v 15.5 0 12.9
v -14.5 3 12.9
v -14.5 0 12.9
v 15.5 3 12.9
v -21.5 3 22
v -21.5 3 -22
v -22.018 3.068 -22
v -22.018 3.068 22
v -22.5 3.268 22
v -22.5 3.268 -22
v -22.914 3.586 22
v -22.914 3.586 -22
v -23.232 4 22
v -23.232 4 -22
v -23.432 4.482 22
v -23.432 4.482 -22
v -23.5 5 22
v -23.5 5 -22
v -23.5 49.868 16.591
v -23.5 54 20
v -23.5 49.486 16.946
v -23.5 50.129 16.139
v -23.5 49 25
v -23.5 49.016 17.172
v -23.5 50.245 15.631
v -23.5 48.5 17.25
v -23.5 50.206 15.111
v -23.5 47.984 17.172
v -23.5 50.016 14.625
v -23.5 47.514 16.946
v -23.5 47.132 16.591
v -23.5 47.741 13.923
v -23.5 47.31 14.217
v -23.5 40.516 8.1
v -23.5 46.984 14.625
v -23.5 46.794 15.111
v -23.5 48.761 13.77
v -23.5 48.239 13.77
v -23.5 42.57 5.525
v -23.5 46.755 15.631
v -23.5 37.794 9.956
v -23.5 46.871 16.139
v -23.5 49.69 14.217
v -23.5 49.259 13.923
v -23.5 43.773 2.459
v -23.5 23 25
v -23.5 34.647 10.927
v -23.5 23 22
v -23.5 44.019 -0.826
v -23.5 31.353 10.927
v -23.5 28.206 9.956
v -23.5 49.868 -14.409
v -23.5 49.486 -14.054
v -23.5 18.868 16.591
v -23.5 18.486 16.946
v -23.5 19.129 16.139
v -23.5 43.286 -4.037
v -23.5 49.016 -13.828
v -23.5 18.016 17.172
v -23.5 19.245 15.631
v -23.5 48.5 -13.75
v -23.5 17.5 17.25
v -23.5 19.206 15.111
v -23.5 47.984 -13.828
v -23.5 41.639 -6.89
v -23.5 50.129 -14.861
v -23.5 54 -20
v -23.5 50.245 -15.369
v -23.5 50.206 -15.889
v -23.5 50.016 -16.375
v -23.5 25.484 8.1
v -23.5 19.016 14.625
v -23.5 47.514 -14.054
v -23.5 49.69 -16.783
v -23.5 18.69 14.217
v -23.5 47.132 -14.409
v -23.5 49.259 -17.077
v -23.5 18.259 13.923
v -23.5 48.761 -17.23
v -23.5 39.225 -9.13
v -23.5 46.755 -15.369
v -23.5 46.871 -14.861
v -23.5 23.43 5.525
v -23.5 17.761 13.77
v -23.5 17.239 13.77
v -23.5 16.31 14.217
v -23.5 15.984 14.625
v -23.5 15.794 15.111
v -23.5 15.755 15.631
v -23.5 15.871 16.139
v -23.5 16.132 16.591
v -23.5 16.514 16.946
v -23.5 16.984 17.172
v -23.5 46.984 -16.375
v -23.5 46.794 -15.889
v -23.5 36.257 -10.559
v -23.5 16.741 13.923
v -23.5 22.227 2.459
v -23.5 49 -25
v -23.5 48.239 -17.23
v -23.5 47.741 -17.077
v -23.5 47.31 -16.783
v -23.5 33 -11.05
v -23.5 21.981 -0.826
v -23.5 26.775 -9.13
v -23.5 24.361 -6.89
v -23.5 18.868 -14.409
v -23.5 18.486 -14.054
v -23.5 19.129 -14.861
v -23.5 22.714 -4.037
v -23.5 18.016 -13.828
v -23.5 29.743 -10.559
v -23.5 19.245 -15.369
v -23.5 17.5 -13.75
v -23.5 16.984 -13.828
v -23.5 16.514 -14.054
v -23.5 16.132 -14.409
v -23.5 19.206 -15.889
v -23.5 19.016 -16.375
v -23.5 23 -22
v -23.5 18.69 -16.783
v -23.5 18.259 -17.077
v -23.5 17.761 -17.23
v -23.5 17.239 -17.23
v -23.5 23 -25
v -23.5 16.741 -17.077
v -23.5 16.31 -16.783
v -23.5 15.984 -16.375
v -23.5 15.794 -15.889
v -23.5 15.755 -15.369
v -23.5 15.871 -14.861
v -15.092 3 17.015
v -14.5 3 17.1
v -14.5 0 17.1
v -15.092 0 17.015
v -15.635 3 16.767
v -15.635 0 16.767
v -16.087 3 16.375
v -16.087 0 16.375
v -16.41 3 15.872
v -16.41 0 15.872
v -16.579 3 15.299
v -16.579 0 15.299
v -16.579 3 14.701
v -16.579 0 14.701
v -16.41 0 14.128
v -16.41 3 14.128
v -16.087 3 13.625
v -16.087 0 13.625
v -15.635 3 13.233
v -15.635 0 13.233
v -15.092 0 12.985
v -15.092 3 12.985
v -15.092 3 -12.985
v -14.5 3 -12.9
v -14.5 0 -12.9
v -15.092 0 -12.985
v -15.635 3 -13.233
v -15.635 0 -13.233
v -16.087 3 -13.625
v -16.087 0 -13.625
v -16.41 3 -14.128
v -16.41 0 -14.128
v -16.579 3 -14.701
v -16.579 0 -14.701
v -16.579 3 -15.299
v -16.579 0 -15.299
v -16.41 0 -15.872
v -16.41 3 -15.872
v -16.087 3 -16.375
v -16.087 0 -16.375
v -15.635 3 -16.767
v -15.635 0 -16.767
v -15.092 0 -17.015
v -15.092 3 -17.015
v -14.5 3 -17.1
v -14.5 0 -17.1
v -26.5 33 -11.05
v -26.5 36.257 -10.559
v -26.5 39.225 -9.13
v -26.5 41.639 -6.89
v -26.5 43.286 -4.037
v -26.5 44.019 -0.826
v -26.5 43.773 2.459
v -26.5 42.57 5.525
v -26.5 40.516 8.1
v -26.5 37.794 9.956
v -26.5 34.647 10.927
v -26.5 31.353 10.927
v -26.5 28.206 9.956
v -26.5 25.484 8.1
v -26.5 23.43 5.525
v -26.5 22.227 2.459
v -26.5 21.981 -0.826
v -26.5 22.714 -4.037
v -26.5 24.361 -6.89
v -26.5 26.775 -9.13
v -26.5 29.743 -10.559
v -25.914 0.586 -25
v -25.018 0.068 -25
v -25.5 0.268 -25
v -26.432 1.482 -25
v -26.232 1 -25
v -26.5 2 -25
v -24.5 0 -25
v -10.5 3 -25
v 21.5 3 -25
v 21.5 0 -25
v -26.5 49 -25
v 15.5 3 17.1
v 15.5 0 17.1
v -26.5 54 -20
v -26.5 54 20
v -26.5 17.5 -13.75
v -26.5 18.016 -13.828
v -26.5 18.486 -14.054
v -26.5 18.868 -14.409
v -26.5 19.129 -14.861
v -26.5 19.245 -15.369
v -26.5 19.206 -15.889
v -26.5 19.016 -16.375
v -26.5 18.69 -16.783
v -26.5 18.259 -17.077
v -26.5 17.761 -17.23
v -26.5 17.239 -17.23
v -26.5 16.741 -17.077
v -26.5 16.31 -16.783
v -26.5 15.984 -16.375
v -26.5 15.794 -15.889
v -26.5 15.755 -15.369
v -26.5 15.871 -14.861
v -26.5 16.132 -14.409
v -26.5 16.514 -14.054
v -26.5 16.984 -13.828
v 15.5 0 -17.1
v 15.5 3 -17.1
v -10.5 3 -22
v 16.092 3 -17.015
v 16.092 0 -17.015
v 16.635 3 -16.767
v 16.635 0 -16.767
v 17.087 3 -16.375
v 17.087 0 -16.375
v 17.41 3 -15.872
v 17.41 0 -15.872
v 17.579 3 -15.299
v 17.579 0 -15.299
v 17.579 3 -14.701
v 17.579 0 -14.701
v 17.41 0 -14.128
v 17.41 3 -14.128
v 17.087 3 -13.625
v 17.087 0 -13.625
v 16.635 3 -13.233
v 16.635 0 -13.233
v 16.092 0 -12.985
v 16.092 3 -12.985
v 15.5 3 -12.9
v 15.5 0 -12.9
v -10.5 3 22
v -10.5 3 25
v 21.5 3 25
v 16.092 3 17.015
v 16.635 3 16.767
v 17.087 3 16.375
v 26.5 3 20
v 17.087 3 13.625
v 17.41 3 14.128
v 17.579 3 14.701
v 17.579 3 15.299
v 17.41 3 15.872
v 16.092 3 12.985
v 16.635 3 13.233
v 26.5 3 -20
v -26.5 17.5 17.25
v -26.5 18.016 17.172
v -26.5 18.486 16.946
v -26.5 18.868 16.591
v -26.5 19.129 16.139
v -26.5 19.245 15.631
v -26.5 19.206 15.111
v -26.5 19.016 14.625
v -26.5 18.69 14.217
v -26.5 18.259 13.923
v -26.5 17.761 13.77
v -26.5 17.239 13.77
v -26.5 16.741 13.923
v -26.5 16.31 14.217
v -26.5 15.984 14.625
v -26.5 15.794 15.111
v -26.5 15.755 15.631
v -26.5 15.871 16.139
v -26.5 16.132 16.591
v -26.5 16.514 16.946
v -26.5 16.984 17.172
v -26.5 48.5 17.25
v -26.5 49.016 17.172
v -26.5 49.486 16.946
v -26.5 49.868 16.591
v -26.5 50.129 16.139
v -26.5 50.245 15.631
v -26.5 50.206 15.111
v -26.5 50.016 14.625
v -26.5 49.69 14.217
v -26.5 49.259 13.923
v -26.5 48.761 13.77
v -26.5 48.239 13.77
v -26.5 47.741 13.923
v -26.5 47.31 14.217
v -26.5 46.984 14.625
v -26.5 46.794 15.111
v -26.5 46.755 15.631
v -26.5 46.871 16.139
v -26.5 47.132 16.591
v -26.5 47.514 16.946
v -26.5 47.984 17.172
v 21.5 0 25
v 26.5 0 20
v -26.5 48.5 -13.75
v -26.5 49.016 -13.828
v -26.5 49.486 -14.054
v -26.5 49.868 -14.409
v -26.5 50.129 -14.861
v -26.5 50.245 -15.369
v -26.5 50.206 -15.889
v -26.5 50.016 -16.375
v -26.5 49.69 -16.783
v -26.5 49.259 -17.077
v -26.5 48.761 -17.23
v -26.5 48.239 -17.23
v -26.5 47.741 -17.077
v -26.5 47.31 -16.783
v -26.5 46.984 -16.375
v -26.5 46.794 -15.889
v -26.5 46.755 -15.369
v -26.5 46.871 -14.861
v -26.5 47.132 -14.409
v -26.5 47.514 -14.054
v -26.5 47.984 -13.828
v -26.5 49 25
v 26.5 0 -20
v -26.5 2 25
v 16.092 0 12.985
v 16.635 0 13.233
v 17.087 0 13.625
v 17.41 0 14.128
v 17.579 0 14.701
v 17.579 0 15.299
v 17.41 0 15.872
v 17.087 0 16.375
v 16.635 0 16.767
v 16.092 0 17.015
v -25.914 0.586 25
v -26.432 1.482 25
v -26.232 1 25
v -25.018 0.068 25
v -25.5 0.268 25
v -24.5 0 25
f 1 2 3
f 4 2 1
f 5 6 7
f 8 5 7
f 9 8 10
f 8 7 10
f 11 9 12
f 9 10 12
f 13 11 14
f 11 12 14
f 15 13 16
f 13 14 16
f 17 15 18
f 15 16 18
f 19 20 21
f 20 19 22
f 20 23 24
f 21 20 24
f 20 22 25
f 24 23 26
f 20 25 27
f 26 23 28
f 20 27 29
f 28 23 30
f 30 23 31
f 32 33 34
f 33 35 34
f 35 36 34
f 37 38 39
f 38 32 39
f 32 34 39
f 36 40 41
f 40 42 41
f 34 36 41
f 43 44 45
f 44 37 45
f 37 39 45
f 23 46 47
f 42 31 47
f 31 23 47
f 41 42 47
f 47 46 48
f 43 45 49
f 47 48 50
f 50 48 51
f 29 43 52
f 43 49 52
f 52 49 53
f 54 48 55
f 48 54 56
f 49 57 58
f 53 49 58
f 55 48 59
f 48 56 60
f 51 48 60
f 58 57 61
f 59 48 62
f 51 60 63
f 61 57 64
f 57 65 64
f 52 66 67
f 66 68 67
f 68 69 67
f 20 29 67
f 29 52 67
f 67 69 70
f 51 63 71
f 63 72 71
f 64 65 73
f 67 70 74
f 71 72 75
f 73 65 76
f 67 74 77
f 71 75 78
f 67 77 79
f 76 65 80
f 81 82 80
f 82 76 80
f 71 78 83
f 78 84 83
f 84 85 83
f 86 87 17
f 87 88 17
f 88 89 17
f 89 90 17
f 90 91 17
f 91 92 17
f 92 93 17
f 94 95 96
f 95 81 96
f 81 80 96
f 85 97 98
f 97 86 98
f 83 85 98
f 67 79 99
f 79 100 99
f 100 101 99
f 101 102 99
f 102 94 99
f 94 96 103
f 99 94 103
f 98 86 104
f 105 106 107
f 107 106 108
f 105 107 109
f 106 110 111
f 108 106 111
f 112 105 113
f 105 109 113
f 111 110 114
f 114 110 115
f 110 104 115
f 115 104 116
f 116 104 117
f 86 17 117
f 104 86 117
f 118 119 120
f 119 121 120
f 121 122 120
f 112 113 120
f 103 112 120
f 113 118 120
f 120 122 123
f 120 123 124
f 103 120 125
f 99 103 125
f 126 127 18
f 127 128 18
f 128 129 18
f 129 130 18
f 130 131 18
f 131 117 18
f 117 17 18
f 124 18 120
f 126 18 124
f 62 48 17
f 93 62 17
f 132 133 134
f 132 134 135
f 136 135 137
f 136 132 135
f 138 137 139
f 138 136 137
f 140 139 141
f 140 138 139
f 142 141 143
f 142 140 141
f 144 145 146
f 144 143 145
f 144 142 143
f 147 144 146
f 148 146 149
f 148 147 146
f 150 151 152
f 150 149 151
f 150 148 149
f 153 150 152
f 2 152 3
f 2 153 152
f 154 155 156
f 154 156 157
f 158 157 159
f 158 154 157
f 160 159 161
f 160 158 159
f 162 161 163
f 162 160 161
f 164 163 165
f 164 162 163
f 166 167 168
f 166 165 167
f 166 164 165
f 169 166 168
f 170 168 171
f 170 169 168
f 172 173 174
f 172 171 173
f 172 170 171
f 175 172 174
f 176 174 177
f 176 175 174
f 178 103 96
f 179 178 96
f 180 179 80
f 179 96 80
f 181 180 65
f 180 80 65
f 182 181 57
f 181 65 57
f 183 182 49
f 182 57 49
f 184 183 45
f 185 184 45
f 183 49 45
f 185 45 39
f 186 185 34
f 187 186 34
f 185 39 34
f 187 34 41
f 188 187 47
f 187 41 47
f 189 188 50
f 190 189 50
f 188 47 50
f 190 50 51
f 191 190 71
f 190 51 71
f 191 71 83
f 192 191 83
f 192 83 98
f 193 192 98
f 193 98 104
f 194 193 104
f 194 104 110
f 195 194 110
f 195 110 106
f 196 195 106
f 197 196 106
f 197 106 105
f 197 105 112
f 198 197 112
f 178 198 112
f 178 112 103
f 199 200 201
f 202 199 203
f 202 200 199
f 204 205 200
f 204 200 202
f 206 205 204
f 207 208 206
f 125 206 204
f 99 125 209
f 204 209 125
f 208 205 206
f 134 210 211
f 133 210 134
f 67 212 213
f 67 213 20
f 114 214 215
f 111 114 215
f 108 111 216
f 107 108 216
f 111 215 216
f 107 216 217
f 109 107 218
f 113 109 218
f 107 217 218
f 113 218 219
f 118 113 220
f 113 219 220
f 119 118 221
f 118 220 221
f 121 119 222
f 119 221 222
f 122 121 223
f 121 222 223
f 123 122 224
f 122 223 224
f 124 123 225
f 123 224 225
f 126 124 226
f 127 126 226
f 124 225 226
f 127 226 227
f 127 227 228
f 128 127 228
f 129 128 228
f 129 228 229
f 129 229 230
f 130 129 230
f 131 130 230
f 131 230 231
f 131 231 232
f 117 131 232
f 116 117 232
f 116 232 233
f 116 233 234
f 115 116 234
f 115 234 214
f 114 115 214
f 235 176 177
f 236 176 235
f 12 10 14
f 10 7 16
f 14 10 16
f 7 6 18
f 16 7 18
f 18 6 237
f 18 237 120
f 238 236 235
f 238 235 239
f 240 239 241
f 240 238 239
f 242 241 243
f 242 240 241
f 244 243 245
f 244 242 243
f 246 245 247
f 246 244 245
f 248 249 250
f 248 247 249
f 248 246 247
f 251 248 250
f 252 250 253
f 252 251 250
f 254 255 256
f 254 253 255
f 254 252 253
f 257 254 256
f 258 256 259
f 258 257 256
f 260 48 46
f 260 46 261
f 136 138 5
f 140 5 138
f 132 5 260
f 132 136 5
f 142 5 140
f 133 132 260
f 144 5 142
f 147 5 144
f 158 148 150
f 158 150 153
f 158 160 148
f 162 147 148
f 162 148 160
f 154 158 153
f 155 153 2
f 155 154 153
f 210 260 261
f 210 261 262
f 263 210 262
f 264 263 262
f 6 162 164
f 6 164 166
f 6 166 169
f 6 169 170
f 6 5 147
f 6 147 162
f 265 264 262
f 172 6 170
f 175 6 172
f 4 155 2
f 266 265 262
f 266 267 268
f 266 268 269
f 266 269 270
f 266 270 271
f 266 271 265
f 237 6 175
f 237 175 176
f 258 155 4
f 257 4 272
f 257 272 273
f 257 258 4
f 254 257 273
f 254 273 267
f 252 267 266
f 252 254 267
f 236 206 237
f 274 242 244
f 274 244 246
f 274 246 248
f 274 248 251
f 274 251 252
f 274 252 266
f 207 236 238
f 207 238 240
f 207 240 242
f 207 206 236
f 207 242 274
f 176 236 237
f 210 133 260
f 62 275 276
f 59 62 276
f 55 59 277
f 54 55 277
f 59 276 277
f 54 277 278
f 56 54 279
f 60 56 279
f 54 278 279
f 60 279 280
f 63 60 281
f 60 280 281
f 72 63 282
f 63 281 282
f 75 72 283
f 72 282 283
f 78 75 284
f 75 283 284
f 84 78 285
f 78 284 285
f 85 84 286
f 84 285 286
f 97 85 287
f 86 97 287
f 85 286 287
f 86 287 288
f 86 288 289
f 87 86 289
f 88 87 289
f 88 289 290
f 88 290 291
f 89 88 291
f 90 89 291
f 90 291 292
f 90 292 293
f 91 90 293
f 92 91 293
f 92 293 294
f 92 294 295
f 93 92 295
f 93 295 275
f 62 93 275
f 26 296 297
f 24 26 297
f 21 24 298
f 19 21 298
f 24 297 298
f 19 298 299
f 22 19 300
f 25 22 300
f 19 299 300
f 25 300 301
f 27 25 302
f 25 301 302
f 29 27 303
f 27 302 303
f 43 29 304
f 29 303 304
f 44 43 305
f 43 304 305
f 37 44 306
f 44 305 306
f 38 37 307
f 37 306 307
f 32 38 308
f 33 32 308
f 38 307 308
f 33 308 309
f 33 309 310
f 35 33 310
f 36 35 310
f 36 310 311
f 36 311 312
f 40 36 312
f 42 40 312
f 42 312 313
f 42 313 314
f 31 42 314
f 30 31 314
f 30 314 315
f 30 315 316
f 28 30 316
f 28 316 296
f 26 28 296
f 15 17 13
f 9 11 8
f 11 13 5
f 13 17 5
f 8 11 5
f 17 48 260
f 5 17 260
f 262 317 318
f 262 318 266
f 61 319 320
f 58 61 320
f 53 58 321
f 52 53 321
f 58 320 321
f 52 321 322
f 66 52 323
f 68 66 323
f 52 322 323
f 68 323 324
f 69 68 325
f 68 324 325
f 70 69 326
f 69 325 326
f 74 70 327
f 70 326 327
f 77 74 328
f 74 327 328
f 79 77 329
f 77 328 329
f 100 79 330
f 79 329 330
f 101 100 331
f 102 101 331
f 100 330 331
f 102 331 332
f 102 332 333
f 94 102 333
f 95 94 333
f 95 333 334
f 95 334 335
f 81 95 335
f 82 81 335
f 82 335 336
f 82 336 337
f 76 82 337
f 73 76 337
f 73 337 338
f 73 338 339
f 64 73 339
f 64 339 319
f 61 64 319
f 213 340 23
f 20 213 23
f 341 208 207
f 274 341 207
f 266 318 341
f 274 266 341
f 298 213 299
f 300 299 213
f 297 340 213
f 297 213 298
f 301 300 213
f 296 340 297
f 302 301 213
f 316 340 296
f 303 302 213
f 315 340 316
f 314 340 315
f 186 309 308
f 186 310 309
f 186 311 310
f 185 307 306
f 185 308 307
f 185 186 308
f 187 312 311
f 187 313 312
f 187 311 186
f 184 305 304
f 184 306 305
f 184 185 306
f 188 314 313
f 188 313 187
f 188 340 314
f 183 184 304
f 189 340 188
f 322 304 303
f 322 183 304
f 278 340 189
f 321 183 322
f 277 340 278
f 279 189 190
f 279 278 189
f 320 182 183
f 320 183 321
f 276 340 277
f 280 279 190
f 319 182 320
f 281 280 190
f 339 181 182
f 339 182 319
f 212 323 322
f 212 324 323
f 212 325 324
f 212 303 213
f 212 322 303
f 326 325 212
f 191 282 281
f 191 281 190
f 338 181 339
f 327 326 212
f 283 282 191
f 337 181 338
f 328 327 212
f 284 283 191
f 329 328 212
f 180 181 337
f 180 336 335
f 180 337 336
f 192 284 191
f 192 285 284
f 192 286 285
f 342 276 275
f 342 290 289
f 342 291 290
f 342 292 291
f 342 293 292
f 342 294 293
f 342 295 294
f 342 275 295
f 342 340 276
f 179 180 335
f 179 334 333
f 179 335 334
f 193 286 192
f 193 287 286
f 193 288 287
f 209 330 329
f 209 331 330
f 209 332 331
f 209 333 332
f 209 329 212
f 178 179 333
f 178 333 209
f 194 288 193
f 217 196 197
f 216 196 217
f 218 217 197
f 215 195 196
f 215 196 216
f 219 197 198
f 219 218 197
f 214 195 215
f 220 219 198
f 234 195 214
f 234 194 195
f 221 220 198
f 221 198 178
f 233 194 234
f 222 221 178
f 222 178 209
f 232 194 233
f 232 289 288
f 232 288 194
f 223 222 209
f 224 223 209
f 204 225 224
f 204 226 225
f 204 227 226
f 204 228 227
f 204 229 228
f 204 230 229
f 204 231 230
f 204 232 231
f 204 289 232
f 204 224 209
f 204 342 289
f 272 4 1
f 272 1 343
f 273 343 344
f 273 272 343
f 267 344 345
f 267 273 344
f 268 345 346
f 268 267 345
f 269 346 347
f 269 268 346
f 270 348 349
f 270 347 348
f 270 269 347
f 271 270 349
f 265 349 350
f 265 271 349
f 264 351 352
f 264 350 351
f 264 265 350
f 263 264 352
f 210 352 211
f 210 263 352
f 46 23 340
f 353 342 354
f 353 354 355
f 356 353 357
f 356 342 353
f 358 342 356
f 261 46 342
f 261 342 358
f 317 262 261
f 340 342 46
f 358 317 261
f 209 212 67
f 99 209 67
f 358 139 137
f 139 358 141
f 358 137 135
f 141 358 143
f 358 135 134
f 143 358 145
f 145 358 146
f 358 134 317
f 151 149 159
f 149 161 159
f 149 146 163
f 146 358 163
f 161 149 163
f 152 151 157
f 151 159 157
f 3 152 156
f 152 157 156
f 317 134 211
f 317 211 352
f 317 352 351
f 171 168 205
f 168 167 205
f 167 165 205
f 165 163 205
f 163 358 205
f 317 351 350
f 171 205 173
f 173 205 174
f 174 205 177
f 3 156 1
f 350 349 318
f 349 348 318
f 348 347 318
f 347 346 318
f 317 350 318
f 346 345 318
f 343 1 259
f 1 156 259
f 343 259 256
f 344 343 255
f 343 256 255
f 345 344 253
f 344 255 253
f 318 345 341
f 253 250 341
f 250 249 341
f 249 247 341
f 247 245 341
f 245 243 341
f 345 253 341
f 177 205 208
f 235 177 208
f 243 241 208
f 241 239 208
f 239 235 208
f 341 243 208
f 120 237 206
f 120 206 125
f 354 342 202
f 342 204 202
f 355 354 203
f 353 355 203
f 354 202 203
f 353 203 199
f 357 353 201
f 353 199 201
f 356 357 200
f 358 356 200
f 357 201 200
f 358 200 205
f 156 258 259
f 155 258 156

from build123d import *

# Parameters (mm, degrees)
SKETCH_1_W              = 53
SKETCH_1_H              = 50
EXTRUDE_1_DEPTH         = 3
CHAMFER_1_SIZE          = 5
CUT_EXTRUDE_1_REACH     = 38.555
SKETCH_3_W              = 3
SKETCH_3_H              = 50
EXTRUDE_2_DEPTH         = 51
FILLET_1_R              = 2
RIB_1_REACH             = 80.219
SKETCH_6_WALL_W         = 182.292207198
SKETCH_6_WALL_H         = 3
RIB_3_REACH             = 80.219
SKETCH_8_WALL_W         = 182.292207198
SKETCH_8_WALL_H         = 3
CHAMFER_2_SIZE          = 5
CUT_EXTRUDE_2_REACH     = 79.724
SKETCH_9_R              = 11.05
HOLE_WIZARD_3_5_3_5_1_D = 3.5


with BuildPart() as part:
    # 草图1 → 凸台-拉伸1 (new body)
    with BuildSketch(Plane(origin=(0, 0, 0), x_dir=(1, 0, 0), z_dir=(0, 1, 0))):
        Rectangle(SKETCH_1_W, SKETCH_1_H)
    extrude(amount=EXTRUDE_1_DEPTH)

    # 倒角1
    chamfer_1_edges = [part.edges().sort_by_distance(p)[0] for p in [
        (26.5, 1.5, 25),
        (26.5, 1.5, -25),
    ]]
    chamfer(chamfer_1_edges, length=CHAMFER_1_SIZE)

    # 草图2 → 切除-拉伸1 (cut, up to next)
    with BuildSketch(Plane(origin=(0, 3, 0), x_dir=(1, 0, 0), z_dir=(0, 1, 0)), mode=Mode.PRIVATE) as cut_extrude_1_sk1:
        with BuildLine():
            Line((-14.5, 17.1), (15.5, 17.1))
            ThreePointArc((15.5, 17.1), (17.6, 15), (15.5, 12.9))
            Line((15.5, 12.9), (-14.5, 12.9))
            ThreePointArc((-14.5, 12.9), (-16.6, 15), (-14.5, 17.1))
        make_face()
    cut_extrude_1_tool1 = extrude(cut_extrude_1_sk1.sketch, amount=-CUT_EXTRUDE_1_REACH, mode=Mode.PRIVATE) & part.part
    # 草图2 → 切除-拉伸1 (cut, up to next)
    with BuildSketch(Plane(origin=(0, 3, 0), x_dir=(1, 0, 0), z_dir=(0, 1, 0)), mode=Mode.PRIVATE) as cut_extrude_1_sk2:
        with BuildLine():
            Line((-14.5, -12.9), (15.5, -12.9))
            ThreePointArc((15.5, -12.9), (17.6, -15), (15.5, -17.1))
            Line((15.5, -17.1), (-14.5, -17.1))
            ThreePointArc((-14.5, -17.1), (-16.6, -15), (-14.5, -12.9))
        make_face()
    cut_extrude_1_tool2 = extrude(cut_extrude_1_sk2.sketch, amount=-CUT_EXTRUDE_1_REACH, mode=Mode.PRIVATE) & part.part
    add(cut_extrude_1_tool1.solids().sort_by_distance((0.5, 3, -15))[0], mode=Mode.SUBTRACT)
    add(cut_extrude_1_tool2.solids().sort_by_distance((0.5, 3, 15))[0], mode=Mode.SUBTRACT)

    # 草图3 → 凸台-拉伸2 (add)
    with BuildSketch(Plane(origin=(0, 3, 0), x_dir=(1, 0, 0), z_dir=(0, 1, 0))):
        with Locations((-25, 0)):
            Rectangle(SKETCH_3_W, SKETCH_3_H)
    extrude(amount=EXTRUDE_2_DEPTH)

    # 圆角1
    fillet_1_edges = [part.edges().sort_by_distance(p)[0] for p in [
        (-26.5, 0, 0),
        (-23.5, 3, 0),
    ]]
    fillet(fillet_1_edges, radius=FILLET_1_R)

    # 草图6 wall → 筋1 (add, up to next)
    with BuildSketch(Plane(origin=(-17, 13, 25), x_dir=(0.544988350595, -0.838443616301, 0), z_dir=(0.838443616301, 0.544988350595, 0)), mode=Mode.PRIVATE) as rib_1_sk1:
        with Locations((0, 1.5)):
            Rectangle(SKETCH_6_WALL_W, SKETCH_6_WALL_H)
    rib_1_tool1 = extrude(rib_1_sk1.sketch, amount=-RIB_1_REACH, mode=Mode.PRIVATE) - part.part
    add(rib_1_tool1.solids().sort_by_distance((-17, 13, 25))[0])

    # 草图8 wall → 筋3 (add, up to next)
    with BuildSketch(Plane(origin=(-17, 13, -25), x_dir=(-0.544988350595, 0.838443616301, 0), z_dir=(0.838443616301, 0.544988350595, 0)), mode=Mode.PRIVATE) as rib_3_sk1:
        with Locations((0, 1.5)):
            Rectangle(SKETCH_8_WALL_W, SKETCH_8_WALL_H)
    rib_3_tool1 = extrude(rib_3_sk1.sketch, amount=-RIB_3_REACH, mode=Mode.PRIVATE) - part.part
    add(rib_3_tool1.solids().sort_by_distance((-17, 13, -25))[0])

    # 倒角2
    chamfer_2_edges = [part.edges().sort_by_distance(p)[0] for p in [
        (-25, 54, 25),
        (-25, 54, -25),
    ]]
    chamfer(chamfer_2_edges, length=CHAMFER_2_SIZE)

    # 草图9 → 切除-拉伸2 (cut, up to next)
    with BuildSketch(Plane(origin=(-23.5, 0, 0), x_dir=(0, 0, -1), z_dir=(1, 0, 0)), mode=Mode.PRIVATE) as cut_extrude_2_sk1:
        with Locations((0, 33)):
            Circle(SKETCH_9_R)
    cut_extrude_2_tool1 = extrude(cut_extrude_2_sk1.sketch, amount=-CUT_EXTRUDE_2_REACH, mode=Mode.PRIVATE) & part.part
    add(cut_extrude_2_tool1.solids().sort_by_distance((-23.5, 33, 0))[0], mode=Mode.SUBTRACT)

    # Ø3.5 (3.5) 直径孔1 (through all)
    with Locations(Plane(origin=(-23.5, 0, 0), x_dir=(0, 0, -1), z_dir=(1, 0, 0))):
        with Locations((-15.5, 48.5), (-15.5, 17.5), (15.5, 17.5), (15.5, 48.5)):
            Hole(HOLE_WIZARD_3_5_3_5_1_D / 2)


solid = part.part
